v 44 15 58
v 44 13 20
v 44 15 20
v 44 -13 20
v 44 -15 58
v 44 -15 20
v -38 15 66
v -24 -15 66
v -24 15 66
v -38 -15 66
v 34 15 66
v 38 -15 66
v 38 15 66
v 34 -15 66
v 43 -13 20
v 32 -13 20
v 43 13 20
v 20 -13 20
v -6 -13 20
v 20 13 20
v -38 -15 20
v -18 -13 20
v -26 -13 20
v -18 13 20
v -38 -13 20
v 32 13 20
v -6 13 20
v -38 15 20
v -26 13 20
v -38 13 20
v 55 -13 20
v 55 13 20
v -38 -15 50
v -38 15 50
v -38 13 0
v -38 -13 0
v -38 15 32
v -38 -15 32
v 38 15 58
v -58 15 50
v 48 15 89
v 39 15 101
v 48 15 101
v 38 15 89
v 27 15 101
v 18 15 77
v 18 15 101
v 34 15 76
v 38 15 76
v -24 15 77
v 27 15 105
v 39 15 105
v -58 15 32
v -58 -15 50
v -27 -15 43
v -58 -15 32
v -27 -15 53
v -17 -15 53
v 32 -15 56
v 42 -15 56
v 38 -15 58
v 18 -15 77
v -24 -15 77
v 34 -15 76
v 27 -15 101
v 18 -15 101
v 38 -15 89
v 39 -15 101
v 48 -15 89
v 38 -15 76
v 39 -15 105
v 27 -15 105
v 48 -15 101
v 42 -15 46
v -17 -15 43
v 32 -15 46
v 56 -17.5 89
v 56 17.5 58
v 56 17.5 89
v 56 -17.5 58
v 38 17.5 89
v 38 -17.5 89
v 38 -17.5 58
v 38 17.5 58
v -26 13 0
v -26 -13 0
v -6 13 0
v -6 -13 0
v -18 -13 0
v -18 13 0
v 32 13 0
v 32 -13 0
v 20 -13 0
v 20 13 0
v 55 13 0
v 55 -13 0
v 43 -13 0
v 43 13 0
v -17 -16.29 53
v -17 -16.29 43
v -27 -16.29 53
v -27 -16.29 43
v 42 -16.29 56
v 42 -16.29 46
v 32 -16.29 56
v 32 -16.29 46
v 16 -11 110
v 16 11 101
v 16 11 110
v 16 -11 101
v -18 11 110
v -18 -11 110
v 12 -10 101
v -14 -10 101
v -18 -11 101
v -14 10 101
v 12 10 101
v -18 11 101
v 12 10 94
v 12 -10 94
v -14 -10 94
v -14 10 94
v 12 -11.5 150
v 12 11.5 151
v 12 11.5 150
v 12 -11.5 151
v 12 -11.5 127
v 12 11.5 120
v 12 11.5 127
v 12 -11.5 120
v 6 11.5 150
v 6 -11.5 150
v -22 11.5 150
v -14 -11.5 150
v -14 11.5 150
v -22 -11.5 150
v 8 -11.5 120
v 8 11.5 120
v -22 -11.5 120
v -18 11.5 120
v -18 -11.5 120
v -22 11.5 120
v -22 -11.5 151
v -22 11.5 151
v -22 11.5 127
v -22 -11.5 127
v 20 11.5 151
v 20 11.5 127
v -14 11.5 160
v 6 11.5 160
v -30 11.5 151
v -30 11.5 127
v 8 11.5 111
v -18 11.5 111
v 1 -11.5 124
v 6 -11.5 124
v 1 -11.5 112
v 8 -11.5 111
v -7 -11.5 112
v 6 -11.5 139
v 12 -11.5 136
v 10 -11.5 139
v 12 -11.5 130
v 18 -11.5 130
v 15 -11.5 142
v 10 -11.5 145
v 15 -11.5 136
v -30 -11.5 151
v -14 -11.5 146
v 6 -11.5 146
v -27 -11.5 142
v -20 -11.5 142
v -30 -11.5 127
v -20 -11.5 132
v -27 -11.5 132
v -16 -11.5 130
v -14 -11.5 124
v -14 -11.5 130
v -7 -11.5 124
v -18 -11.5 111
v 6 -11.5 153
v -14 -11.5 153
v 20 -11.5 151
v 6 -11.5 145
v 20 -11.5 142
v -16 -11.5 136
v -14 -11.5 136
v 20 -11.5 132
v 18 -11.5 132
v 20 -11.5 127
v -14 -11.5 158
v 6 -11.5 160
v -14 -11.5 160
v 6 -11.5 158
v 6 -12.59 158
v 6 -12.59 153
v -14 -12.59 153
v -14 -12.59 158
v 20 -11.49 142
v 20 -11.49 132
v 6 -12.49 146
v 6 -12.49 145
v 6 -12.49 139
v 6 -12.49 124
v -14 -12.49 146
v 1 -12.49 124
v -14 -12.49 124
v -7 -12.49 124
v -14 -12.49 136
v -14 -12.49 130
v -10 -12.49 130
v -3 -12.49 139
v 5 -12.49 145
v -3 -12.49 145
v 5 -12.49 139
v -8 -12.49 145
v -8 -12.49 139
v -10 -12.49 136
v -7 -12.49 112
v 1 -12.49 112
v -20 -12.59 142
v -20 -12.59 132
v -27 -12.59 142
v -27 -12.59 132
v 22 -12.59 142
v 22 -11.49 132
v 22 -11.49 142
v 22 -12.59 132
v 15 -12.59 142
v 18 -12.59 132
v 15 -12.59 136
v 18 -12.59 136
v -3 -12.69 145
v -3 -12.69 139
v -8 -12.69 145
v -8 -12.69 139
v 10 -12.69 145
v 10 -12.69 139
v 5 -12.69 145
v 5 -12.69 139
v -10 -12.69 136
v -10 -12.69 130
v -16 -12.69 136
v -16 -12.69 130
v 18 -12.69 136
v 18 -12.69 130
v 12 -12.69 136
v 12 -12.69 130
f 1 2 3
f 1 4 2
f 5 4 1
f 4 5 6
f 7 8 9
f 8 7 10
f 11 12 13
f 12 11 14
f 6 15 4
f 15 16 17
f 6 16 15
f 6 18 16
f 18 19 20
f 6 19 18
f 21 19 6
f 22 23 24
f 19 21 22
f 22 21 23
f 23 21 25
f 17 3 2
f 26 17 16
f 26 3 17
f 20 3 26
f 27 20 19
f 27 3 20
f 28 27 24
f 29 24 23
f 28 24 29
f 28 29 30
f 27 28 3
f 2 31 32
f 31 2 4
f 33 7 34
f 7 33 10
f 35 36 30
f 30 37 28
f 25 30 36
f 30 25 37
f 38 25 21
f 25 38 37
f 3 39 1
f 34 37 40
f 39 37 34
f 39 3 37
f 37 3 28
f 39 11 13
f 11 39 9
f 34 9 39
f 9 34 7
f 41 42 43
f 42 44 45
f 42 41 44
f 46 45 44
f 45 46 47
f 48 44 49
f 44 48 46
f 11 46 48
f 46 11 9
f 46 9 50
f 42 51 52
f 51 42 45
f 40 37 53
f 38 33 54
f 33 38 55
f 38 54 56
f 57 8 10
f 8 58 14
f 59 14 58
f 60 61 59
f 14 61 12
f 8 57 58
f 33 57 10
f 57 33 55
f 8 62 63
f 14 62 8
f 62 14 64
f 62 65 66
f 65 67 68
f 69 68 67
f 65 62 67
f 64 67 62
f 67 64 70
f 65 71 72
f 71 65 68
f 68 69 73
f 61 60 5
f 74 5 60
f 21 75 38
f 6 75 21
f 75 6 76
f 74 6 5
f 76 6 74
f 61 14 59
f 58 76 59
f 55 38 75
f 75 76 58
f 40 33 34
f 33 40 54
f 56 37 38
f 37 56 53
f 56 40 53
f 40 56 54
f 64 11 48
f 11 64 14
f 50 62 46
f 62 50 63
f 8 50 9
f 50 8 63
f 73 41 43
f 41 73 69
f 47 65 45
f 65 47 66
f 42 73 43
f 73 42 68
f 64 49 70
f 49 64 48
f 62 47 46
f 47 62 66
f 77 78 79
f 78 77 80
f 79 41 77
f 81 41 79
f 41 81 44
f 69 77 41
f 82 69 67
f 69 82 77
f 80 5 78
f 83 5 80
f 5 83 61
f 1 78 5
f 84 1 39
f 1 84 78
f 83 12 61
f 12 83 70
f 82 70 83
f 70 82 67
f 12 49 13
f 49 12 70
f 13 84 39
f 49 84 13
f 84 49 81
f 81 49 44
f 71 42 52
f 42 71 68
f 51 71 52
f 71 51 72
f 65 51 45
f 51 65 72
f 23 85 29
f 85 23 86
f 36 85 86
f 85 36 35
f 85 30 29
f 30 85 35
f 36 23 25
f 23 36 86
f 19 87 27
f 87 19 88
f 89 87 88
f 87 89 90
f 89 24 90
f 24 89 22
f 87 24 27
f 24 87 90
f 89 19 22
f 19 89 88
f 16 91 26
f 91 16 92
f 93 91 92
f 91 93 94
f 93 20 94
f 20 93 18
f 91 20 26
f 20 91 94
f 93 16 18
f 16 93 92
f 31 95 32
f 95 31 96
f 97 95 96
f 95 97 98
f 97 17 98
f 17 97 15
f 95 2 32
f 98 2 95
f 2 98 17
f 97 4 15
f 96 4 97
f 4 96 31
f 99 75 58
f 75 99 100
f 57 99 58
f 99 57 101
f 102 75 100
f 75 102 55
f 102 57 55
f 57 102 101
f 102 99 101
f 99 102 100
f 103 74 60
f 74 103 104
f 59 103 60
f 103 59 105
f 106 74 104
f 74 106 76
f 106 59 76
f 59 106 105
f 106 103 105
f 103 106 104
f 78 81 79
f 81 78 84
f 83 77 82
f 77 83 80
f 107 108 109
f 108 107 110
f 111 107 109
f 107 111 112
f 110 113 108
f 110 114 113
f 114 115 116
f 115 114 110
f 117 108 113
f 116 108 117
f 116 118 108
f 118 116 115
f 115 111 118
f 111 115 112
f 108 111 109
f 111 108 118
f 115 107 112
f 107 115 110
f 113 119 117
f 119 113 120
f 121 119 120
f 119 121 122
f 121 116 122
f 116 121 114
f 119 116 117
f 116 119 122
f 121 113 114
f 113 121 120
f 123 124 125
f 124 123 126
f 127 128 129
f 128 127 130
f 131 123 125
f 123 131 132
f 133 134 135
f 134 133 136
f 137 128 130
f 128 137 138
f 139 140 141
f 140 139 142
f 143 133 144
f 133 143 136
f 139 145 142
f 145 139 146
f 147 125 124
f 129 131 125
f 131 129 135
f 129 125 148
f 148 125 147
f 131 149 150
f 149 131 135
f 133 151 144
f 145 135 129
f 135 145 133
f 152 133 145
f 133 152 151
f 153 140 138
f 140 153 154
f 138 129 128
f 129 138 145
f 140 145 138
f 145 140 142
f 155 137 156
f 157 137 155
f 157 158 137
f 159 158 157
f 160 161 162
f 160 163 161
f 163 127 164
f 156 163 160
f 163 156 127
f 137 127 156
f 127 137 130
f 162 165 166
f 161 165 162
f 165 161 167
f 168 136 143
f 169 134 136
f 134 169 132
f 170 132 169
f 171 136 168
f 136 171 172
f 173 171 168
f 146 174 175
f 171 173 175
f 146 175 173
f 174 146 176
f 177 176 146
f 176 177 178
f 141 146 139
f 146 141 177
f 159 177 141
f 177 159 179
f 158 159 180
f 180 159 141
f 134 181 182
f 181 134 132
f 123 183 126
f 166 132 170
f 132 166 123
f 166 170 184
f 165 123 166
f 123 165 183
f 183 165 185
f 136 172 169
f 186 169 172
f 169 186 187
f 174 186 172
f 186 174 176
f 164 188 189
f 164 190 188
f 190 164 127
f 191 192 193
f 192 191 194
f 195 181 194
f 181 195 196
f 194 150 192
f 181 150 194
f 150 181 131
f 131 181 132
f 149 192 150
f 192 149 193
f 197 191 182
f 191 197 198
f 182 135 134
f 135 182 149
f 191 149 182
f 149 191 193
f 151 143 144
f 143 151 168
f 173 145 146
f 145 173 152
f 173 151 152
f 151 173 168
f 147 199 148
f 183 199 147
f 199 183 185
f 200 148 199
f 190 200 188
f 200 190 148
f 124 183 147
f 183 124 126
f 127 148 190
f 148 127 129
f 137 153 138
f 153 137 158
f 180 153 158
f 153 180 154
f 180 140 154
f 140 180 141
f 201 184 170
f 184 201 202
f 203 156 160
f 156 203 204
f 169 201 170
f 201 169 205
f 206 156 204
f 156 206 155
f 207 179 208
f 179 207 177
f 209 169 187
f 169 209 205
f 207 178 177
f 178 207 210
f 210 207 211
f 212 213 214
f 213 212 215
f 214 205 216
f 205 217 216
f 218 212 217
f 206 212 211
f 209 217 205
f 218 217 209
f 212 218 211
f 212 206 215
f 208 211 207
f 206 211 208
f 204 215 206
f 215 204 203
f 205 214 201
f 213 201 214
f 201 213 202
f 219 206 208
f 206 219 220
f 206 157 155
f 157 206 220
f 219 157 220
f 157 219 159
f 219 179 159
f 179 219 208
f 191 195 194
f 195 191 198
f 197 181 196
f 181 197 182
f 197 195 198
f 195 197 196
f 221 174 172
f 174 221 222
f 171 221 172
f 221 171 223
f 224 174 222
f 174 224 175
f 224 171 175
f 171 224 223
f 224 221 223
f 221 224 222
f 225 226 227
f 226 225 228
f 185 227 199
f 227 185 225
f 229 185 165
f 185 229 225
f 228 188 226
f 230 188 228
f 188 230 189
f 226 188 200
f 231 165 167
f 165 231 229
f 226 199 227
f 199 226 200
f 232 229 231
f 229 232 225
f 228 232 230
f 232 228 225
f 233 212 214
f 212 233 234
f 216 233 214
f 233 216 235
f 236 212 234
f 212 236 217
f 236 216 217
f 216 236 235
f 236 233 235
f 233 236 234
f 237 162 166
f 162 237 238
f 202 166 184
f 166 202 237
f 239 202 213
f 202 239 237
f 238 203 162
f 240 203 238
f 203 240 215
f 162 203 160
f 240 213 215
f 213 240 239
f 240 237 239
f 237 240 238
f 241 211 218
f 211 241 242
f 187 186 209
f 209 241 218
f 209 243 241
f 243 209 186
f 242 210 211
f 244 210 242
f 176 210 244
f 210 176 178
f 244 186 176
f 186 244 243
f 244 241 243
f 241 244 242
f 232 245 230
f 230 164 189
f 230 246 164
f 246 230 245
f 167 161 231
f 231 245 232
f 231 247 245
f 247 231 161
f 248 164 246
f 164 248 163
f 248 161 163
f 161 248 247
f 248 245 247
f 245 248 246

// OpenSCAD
// Lightbulb Marker - Version 003
// Rebuilt as a true 3D voxel-style object.
// Changes from previous version:
// - Removed the white sticker outline/backing from the printable geometry.
// - Replaced the flat 2.5D layout with deep orange body volumes.
// - Shrunk and raised the bulb into a smaller chunky 3D top detail.
// - Kept eyes and bulb markings as shallow raised surface details only.

eps = 0.01;
$fn = 32;

body_depth = 30;
leg_depth = 26;
top_depth = 28;
bulb_depth = 23;
detail_raise = 1.1;

orange = [0.84, 0.40, 0.26];
orange_side = [0.78, 0.34, 0.22];
black = [0.02, 0.02, 0.02];
bulb_yellow = [1.00, 0.82, 0.38];
bulb_light = [1.00, 0.90, 0.58];
bulb_orange = [0.93, 0.54, 0.20];
bulb_red = [0.70, 0.22, 0.18];
base_gray = [0.60, 0.60, 0.55];
base_dark = [0.38, 0.39, 0.36];

// Rectangles are [x, z, width, height] in the front silhouette.
body_core = [
    [-38, 20, 82, 46],   // main mass
    [-58, 32, 20, 18],   // left blocky protrusion
    [-24, 62, 58, 15],   // stepped upper back
    [18, 76, 30, 25],    // tall right shoulder
    [38, 58, 18, 31],    // right face block
    [27, 96, 12, 9]      // small top step
];

leg_blocks = [
    [-38, 0, 12, 20],
    [-18, 0, 12, 20],
    [20, 0, 12, 20],
    [43, 0, 12, 20]
];

eye_blocks = [
    [-27, 43, 10, 10],
    [32, 46, 10, 10]
];

socket_blocks = [
    [-18, 101, 34, 9],
    [-14, 94, 26, 8]
];

bulb_blocks = [
    [-22, 120, 34, 30],  // central bulb body
    [-14, 150, 20, 10],  // top cap
    [-30, 127, 8, 24],   // left side lobe
    [12, 127, 8, 24],    // right side lobe
    [-18, 111, 26, 10]   // lower bulb neck
];

bulb_light_blocks = [
    [-14, 124, 20, 22],
    [-7, 112, 8, 12]
];

bulb_orange_blocks = [
    [-14, 153, 20, 5],
    [-27, 132, 7, 10],
    [15, 132, 7, 10]
];

bulb_red_blocks = [
    [-8, 139, 5, 6],
    [5, 139, 5, 6],
    [-16, 130, 6, 6],
    [12, 130, 6, 6]
];

module block3d(x, z, w, d, h, col) {
    color(col)
        translate([x, -d / 2, z])
            cube([w, d, h]);
}

module blocks3d(rects, d, col) {
    union() {
        for (r = rects)
            block3d(r[0], r[1], r[2], d, r[3], col);
    }
}

module front_detail(x, z, w, h, base_depth, col, raise = detail_raise) {
    color(col)
        translate([x, -base_depth / 2 - raise + eps, z])
            cube([w, raise, h]);
}

module front_details(rects, base_depth, col, raise = detail_raise) {
    union() {
        for (r = rects)
            front_detail(r[0], r[1], r[2], r[3], base_depth, col, raise);
    }
}

module orange_body() {
    union() {
        blocks3d(body_core, body_depth, orange);
        blocks3d(leg_blocks, leg_depth, orange);

        // Slightly darker side slab gives the body real visual depth in 3/4 view.
        block3d(38, 58, 18, body_depth + 5, 31, orange_side);

        front_details(eye_blocks, body_depth, black, 1.3);
    }
}

module socket() {
    union() {
        block3d(socket_blocks[0][0], socket_blocks[0][1], socket_blocks[0][2], 22, socket_blocks[0][3], base_gray);
        block3d(socket_blocks[1][0], socket_blocks[1][1], socket_blocks[1][2], 20, socket_blocks[1][3], base_dark);
    }
}

module chunky_bulb() {
    union() {
        blocks3d(bulb_blocks, bulb_depth, bulb_yellow);
        front_details(bulb_light_blocks, bulb_depth, bulb_light, 1.0);
        front_details(bulb_orange_blocks, bulb_depth, bulb_orange, 1.1);
        front_details(bulb_red_blocks, bulb_depth, bulb_red, 1.2);
    }
}

module model() {
    union() {
        orange_body();
        socket();
        chunky_bulb();
    }
}

model();
